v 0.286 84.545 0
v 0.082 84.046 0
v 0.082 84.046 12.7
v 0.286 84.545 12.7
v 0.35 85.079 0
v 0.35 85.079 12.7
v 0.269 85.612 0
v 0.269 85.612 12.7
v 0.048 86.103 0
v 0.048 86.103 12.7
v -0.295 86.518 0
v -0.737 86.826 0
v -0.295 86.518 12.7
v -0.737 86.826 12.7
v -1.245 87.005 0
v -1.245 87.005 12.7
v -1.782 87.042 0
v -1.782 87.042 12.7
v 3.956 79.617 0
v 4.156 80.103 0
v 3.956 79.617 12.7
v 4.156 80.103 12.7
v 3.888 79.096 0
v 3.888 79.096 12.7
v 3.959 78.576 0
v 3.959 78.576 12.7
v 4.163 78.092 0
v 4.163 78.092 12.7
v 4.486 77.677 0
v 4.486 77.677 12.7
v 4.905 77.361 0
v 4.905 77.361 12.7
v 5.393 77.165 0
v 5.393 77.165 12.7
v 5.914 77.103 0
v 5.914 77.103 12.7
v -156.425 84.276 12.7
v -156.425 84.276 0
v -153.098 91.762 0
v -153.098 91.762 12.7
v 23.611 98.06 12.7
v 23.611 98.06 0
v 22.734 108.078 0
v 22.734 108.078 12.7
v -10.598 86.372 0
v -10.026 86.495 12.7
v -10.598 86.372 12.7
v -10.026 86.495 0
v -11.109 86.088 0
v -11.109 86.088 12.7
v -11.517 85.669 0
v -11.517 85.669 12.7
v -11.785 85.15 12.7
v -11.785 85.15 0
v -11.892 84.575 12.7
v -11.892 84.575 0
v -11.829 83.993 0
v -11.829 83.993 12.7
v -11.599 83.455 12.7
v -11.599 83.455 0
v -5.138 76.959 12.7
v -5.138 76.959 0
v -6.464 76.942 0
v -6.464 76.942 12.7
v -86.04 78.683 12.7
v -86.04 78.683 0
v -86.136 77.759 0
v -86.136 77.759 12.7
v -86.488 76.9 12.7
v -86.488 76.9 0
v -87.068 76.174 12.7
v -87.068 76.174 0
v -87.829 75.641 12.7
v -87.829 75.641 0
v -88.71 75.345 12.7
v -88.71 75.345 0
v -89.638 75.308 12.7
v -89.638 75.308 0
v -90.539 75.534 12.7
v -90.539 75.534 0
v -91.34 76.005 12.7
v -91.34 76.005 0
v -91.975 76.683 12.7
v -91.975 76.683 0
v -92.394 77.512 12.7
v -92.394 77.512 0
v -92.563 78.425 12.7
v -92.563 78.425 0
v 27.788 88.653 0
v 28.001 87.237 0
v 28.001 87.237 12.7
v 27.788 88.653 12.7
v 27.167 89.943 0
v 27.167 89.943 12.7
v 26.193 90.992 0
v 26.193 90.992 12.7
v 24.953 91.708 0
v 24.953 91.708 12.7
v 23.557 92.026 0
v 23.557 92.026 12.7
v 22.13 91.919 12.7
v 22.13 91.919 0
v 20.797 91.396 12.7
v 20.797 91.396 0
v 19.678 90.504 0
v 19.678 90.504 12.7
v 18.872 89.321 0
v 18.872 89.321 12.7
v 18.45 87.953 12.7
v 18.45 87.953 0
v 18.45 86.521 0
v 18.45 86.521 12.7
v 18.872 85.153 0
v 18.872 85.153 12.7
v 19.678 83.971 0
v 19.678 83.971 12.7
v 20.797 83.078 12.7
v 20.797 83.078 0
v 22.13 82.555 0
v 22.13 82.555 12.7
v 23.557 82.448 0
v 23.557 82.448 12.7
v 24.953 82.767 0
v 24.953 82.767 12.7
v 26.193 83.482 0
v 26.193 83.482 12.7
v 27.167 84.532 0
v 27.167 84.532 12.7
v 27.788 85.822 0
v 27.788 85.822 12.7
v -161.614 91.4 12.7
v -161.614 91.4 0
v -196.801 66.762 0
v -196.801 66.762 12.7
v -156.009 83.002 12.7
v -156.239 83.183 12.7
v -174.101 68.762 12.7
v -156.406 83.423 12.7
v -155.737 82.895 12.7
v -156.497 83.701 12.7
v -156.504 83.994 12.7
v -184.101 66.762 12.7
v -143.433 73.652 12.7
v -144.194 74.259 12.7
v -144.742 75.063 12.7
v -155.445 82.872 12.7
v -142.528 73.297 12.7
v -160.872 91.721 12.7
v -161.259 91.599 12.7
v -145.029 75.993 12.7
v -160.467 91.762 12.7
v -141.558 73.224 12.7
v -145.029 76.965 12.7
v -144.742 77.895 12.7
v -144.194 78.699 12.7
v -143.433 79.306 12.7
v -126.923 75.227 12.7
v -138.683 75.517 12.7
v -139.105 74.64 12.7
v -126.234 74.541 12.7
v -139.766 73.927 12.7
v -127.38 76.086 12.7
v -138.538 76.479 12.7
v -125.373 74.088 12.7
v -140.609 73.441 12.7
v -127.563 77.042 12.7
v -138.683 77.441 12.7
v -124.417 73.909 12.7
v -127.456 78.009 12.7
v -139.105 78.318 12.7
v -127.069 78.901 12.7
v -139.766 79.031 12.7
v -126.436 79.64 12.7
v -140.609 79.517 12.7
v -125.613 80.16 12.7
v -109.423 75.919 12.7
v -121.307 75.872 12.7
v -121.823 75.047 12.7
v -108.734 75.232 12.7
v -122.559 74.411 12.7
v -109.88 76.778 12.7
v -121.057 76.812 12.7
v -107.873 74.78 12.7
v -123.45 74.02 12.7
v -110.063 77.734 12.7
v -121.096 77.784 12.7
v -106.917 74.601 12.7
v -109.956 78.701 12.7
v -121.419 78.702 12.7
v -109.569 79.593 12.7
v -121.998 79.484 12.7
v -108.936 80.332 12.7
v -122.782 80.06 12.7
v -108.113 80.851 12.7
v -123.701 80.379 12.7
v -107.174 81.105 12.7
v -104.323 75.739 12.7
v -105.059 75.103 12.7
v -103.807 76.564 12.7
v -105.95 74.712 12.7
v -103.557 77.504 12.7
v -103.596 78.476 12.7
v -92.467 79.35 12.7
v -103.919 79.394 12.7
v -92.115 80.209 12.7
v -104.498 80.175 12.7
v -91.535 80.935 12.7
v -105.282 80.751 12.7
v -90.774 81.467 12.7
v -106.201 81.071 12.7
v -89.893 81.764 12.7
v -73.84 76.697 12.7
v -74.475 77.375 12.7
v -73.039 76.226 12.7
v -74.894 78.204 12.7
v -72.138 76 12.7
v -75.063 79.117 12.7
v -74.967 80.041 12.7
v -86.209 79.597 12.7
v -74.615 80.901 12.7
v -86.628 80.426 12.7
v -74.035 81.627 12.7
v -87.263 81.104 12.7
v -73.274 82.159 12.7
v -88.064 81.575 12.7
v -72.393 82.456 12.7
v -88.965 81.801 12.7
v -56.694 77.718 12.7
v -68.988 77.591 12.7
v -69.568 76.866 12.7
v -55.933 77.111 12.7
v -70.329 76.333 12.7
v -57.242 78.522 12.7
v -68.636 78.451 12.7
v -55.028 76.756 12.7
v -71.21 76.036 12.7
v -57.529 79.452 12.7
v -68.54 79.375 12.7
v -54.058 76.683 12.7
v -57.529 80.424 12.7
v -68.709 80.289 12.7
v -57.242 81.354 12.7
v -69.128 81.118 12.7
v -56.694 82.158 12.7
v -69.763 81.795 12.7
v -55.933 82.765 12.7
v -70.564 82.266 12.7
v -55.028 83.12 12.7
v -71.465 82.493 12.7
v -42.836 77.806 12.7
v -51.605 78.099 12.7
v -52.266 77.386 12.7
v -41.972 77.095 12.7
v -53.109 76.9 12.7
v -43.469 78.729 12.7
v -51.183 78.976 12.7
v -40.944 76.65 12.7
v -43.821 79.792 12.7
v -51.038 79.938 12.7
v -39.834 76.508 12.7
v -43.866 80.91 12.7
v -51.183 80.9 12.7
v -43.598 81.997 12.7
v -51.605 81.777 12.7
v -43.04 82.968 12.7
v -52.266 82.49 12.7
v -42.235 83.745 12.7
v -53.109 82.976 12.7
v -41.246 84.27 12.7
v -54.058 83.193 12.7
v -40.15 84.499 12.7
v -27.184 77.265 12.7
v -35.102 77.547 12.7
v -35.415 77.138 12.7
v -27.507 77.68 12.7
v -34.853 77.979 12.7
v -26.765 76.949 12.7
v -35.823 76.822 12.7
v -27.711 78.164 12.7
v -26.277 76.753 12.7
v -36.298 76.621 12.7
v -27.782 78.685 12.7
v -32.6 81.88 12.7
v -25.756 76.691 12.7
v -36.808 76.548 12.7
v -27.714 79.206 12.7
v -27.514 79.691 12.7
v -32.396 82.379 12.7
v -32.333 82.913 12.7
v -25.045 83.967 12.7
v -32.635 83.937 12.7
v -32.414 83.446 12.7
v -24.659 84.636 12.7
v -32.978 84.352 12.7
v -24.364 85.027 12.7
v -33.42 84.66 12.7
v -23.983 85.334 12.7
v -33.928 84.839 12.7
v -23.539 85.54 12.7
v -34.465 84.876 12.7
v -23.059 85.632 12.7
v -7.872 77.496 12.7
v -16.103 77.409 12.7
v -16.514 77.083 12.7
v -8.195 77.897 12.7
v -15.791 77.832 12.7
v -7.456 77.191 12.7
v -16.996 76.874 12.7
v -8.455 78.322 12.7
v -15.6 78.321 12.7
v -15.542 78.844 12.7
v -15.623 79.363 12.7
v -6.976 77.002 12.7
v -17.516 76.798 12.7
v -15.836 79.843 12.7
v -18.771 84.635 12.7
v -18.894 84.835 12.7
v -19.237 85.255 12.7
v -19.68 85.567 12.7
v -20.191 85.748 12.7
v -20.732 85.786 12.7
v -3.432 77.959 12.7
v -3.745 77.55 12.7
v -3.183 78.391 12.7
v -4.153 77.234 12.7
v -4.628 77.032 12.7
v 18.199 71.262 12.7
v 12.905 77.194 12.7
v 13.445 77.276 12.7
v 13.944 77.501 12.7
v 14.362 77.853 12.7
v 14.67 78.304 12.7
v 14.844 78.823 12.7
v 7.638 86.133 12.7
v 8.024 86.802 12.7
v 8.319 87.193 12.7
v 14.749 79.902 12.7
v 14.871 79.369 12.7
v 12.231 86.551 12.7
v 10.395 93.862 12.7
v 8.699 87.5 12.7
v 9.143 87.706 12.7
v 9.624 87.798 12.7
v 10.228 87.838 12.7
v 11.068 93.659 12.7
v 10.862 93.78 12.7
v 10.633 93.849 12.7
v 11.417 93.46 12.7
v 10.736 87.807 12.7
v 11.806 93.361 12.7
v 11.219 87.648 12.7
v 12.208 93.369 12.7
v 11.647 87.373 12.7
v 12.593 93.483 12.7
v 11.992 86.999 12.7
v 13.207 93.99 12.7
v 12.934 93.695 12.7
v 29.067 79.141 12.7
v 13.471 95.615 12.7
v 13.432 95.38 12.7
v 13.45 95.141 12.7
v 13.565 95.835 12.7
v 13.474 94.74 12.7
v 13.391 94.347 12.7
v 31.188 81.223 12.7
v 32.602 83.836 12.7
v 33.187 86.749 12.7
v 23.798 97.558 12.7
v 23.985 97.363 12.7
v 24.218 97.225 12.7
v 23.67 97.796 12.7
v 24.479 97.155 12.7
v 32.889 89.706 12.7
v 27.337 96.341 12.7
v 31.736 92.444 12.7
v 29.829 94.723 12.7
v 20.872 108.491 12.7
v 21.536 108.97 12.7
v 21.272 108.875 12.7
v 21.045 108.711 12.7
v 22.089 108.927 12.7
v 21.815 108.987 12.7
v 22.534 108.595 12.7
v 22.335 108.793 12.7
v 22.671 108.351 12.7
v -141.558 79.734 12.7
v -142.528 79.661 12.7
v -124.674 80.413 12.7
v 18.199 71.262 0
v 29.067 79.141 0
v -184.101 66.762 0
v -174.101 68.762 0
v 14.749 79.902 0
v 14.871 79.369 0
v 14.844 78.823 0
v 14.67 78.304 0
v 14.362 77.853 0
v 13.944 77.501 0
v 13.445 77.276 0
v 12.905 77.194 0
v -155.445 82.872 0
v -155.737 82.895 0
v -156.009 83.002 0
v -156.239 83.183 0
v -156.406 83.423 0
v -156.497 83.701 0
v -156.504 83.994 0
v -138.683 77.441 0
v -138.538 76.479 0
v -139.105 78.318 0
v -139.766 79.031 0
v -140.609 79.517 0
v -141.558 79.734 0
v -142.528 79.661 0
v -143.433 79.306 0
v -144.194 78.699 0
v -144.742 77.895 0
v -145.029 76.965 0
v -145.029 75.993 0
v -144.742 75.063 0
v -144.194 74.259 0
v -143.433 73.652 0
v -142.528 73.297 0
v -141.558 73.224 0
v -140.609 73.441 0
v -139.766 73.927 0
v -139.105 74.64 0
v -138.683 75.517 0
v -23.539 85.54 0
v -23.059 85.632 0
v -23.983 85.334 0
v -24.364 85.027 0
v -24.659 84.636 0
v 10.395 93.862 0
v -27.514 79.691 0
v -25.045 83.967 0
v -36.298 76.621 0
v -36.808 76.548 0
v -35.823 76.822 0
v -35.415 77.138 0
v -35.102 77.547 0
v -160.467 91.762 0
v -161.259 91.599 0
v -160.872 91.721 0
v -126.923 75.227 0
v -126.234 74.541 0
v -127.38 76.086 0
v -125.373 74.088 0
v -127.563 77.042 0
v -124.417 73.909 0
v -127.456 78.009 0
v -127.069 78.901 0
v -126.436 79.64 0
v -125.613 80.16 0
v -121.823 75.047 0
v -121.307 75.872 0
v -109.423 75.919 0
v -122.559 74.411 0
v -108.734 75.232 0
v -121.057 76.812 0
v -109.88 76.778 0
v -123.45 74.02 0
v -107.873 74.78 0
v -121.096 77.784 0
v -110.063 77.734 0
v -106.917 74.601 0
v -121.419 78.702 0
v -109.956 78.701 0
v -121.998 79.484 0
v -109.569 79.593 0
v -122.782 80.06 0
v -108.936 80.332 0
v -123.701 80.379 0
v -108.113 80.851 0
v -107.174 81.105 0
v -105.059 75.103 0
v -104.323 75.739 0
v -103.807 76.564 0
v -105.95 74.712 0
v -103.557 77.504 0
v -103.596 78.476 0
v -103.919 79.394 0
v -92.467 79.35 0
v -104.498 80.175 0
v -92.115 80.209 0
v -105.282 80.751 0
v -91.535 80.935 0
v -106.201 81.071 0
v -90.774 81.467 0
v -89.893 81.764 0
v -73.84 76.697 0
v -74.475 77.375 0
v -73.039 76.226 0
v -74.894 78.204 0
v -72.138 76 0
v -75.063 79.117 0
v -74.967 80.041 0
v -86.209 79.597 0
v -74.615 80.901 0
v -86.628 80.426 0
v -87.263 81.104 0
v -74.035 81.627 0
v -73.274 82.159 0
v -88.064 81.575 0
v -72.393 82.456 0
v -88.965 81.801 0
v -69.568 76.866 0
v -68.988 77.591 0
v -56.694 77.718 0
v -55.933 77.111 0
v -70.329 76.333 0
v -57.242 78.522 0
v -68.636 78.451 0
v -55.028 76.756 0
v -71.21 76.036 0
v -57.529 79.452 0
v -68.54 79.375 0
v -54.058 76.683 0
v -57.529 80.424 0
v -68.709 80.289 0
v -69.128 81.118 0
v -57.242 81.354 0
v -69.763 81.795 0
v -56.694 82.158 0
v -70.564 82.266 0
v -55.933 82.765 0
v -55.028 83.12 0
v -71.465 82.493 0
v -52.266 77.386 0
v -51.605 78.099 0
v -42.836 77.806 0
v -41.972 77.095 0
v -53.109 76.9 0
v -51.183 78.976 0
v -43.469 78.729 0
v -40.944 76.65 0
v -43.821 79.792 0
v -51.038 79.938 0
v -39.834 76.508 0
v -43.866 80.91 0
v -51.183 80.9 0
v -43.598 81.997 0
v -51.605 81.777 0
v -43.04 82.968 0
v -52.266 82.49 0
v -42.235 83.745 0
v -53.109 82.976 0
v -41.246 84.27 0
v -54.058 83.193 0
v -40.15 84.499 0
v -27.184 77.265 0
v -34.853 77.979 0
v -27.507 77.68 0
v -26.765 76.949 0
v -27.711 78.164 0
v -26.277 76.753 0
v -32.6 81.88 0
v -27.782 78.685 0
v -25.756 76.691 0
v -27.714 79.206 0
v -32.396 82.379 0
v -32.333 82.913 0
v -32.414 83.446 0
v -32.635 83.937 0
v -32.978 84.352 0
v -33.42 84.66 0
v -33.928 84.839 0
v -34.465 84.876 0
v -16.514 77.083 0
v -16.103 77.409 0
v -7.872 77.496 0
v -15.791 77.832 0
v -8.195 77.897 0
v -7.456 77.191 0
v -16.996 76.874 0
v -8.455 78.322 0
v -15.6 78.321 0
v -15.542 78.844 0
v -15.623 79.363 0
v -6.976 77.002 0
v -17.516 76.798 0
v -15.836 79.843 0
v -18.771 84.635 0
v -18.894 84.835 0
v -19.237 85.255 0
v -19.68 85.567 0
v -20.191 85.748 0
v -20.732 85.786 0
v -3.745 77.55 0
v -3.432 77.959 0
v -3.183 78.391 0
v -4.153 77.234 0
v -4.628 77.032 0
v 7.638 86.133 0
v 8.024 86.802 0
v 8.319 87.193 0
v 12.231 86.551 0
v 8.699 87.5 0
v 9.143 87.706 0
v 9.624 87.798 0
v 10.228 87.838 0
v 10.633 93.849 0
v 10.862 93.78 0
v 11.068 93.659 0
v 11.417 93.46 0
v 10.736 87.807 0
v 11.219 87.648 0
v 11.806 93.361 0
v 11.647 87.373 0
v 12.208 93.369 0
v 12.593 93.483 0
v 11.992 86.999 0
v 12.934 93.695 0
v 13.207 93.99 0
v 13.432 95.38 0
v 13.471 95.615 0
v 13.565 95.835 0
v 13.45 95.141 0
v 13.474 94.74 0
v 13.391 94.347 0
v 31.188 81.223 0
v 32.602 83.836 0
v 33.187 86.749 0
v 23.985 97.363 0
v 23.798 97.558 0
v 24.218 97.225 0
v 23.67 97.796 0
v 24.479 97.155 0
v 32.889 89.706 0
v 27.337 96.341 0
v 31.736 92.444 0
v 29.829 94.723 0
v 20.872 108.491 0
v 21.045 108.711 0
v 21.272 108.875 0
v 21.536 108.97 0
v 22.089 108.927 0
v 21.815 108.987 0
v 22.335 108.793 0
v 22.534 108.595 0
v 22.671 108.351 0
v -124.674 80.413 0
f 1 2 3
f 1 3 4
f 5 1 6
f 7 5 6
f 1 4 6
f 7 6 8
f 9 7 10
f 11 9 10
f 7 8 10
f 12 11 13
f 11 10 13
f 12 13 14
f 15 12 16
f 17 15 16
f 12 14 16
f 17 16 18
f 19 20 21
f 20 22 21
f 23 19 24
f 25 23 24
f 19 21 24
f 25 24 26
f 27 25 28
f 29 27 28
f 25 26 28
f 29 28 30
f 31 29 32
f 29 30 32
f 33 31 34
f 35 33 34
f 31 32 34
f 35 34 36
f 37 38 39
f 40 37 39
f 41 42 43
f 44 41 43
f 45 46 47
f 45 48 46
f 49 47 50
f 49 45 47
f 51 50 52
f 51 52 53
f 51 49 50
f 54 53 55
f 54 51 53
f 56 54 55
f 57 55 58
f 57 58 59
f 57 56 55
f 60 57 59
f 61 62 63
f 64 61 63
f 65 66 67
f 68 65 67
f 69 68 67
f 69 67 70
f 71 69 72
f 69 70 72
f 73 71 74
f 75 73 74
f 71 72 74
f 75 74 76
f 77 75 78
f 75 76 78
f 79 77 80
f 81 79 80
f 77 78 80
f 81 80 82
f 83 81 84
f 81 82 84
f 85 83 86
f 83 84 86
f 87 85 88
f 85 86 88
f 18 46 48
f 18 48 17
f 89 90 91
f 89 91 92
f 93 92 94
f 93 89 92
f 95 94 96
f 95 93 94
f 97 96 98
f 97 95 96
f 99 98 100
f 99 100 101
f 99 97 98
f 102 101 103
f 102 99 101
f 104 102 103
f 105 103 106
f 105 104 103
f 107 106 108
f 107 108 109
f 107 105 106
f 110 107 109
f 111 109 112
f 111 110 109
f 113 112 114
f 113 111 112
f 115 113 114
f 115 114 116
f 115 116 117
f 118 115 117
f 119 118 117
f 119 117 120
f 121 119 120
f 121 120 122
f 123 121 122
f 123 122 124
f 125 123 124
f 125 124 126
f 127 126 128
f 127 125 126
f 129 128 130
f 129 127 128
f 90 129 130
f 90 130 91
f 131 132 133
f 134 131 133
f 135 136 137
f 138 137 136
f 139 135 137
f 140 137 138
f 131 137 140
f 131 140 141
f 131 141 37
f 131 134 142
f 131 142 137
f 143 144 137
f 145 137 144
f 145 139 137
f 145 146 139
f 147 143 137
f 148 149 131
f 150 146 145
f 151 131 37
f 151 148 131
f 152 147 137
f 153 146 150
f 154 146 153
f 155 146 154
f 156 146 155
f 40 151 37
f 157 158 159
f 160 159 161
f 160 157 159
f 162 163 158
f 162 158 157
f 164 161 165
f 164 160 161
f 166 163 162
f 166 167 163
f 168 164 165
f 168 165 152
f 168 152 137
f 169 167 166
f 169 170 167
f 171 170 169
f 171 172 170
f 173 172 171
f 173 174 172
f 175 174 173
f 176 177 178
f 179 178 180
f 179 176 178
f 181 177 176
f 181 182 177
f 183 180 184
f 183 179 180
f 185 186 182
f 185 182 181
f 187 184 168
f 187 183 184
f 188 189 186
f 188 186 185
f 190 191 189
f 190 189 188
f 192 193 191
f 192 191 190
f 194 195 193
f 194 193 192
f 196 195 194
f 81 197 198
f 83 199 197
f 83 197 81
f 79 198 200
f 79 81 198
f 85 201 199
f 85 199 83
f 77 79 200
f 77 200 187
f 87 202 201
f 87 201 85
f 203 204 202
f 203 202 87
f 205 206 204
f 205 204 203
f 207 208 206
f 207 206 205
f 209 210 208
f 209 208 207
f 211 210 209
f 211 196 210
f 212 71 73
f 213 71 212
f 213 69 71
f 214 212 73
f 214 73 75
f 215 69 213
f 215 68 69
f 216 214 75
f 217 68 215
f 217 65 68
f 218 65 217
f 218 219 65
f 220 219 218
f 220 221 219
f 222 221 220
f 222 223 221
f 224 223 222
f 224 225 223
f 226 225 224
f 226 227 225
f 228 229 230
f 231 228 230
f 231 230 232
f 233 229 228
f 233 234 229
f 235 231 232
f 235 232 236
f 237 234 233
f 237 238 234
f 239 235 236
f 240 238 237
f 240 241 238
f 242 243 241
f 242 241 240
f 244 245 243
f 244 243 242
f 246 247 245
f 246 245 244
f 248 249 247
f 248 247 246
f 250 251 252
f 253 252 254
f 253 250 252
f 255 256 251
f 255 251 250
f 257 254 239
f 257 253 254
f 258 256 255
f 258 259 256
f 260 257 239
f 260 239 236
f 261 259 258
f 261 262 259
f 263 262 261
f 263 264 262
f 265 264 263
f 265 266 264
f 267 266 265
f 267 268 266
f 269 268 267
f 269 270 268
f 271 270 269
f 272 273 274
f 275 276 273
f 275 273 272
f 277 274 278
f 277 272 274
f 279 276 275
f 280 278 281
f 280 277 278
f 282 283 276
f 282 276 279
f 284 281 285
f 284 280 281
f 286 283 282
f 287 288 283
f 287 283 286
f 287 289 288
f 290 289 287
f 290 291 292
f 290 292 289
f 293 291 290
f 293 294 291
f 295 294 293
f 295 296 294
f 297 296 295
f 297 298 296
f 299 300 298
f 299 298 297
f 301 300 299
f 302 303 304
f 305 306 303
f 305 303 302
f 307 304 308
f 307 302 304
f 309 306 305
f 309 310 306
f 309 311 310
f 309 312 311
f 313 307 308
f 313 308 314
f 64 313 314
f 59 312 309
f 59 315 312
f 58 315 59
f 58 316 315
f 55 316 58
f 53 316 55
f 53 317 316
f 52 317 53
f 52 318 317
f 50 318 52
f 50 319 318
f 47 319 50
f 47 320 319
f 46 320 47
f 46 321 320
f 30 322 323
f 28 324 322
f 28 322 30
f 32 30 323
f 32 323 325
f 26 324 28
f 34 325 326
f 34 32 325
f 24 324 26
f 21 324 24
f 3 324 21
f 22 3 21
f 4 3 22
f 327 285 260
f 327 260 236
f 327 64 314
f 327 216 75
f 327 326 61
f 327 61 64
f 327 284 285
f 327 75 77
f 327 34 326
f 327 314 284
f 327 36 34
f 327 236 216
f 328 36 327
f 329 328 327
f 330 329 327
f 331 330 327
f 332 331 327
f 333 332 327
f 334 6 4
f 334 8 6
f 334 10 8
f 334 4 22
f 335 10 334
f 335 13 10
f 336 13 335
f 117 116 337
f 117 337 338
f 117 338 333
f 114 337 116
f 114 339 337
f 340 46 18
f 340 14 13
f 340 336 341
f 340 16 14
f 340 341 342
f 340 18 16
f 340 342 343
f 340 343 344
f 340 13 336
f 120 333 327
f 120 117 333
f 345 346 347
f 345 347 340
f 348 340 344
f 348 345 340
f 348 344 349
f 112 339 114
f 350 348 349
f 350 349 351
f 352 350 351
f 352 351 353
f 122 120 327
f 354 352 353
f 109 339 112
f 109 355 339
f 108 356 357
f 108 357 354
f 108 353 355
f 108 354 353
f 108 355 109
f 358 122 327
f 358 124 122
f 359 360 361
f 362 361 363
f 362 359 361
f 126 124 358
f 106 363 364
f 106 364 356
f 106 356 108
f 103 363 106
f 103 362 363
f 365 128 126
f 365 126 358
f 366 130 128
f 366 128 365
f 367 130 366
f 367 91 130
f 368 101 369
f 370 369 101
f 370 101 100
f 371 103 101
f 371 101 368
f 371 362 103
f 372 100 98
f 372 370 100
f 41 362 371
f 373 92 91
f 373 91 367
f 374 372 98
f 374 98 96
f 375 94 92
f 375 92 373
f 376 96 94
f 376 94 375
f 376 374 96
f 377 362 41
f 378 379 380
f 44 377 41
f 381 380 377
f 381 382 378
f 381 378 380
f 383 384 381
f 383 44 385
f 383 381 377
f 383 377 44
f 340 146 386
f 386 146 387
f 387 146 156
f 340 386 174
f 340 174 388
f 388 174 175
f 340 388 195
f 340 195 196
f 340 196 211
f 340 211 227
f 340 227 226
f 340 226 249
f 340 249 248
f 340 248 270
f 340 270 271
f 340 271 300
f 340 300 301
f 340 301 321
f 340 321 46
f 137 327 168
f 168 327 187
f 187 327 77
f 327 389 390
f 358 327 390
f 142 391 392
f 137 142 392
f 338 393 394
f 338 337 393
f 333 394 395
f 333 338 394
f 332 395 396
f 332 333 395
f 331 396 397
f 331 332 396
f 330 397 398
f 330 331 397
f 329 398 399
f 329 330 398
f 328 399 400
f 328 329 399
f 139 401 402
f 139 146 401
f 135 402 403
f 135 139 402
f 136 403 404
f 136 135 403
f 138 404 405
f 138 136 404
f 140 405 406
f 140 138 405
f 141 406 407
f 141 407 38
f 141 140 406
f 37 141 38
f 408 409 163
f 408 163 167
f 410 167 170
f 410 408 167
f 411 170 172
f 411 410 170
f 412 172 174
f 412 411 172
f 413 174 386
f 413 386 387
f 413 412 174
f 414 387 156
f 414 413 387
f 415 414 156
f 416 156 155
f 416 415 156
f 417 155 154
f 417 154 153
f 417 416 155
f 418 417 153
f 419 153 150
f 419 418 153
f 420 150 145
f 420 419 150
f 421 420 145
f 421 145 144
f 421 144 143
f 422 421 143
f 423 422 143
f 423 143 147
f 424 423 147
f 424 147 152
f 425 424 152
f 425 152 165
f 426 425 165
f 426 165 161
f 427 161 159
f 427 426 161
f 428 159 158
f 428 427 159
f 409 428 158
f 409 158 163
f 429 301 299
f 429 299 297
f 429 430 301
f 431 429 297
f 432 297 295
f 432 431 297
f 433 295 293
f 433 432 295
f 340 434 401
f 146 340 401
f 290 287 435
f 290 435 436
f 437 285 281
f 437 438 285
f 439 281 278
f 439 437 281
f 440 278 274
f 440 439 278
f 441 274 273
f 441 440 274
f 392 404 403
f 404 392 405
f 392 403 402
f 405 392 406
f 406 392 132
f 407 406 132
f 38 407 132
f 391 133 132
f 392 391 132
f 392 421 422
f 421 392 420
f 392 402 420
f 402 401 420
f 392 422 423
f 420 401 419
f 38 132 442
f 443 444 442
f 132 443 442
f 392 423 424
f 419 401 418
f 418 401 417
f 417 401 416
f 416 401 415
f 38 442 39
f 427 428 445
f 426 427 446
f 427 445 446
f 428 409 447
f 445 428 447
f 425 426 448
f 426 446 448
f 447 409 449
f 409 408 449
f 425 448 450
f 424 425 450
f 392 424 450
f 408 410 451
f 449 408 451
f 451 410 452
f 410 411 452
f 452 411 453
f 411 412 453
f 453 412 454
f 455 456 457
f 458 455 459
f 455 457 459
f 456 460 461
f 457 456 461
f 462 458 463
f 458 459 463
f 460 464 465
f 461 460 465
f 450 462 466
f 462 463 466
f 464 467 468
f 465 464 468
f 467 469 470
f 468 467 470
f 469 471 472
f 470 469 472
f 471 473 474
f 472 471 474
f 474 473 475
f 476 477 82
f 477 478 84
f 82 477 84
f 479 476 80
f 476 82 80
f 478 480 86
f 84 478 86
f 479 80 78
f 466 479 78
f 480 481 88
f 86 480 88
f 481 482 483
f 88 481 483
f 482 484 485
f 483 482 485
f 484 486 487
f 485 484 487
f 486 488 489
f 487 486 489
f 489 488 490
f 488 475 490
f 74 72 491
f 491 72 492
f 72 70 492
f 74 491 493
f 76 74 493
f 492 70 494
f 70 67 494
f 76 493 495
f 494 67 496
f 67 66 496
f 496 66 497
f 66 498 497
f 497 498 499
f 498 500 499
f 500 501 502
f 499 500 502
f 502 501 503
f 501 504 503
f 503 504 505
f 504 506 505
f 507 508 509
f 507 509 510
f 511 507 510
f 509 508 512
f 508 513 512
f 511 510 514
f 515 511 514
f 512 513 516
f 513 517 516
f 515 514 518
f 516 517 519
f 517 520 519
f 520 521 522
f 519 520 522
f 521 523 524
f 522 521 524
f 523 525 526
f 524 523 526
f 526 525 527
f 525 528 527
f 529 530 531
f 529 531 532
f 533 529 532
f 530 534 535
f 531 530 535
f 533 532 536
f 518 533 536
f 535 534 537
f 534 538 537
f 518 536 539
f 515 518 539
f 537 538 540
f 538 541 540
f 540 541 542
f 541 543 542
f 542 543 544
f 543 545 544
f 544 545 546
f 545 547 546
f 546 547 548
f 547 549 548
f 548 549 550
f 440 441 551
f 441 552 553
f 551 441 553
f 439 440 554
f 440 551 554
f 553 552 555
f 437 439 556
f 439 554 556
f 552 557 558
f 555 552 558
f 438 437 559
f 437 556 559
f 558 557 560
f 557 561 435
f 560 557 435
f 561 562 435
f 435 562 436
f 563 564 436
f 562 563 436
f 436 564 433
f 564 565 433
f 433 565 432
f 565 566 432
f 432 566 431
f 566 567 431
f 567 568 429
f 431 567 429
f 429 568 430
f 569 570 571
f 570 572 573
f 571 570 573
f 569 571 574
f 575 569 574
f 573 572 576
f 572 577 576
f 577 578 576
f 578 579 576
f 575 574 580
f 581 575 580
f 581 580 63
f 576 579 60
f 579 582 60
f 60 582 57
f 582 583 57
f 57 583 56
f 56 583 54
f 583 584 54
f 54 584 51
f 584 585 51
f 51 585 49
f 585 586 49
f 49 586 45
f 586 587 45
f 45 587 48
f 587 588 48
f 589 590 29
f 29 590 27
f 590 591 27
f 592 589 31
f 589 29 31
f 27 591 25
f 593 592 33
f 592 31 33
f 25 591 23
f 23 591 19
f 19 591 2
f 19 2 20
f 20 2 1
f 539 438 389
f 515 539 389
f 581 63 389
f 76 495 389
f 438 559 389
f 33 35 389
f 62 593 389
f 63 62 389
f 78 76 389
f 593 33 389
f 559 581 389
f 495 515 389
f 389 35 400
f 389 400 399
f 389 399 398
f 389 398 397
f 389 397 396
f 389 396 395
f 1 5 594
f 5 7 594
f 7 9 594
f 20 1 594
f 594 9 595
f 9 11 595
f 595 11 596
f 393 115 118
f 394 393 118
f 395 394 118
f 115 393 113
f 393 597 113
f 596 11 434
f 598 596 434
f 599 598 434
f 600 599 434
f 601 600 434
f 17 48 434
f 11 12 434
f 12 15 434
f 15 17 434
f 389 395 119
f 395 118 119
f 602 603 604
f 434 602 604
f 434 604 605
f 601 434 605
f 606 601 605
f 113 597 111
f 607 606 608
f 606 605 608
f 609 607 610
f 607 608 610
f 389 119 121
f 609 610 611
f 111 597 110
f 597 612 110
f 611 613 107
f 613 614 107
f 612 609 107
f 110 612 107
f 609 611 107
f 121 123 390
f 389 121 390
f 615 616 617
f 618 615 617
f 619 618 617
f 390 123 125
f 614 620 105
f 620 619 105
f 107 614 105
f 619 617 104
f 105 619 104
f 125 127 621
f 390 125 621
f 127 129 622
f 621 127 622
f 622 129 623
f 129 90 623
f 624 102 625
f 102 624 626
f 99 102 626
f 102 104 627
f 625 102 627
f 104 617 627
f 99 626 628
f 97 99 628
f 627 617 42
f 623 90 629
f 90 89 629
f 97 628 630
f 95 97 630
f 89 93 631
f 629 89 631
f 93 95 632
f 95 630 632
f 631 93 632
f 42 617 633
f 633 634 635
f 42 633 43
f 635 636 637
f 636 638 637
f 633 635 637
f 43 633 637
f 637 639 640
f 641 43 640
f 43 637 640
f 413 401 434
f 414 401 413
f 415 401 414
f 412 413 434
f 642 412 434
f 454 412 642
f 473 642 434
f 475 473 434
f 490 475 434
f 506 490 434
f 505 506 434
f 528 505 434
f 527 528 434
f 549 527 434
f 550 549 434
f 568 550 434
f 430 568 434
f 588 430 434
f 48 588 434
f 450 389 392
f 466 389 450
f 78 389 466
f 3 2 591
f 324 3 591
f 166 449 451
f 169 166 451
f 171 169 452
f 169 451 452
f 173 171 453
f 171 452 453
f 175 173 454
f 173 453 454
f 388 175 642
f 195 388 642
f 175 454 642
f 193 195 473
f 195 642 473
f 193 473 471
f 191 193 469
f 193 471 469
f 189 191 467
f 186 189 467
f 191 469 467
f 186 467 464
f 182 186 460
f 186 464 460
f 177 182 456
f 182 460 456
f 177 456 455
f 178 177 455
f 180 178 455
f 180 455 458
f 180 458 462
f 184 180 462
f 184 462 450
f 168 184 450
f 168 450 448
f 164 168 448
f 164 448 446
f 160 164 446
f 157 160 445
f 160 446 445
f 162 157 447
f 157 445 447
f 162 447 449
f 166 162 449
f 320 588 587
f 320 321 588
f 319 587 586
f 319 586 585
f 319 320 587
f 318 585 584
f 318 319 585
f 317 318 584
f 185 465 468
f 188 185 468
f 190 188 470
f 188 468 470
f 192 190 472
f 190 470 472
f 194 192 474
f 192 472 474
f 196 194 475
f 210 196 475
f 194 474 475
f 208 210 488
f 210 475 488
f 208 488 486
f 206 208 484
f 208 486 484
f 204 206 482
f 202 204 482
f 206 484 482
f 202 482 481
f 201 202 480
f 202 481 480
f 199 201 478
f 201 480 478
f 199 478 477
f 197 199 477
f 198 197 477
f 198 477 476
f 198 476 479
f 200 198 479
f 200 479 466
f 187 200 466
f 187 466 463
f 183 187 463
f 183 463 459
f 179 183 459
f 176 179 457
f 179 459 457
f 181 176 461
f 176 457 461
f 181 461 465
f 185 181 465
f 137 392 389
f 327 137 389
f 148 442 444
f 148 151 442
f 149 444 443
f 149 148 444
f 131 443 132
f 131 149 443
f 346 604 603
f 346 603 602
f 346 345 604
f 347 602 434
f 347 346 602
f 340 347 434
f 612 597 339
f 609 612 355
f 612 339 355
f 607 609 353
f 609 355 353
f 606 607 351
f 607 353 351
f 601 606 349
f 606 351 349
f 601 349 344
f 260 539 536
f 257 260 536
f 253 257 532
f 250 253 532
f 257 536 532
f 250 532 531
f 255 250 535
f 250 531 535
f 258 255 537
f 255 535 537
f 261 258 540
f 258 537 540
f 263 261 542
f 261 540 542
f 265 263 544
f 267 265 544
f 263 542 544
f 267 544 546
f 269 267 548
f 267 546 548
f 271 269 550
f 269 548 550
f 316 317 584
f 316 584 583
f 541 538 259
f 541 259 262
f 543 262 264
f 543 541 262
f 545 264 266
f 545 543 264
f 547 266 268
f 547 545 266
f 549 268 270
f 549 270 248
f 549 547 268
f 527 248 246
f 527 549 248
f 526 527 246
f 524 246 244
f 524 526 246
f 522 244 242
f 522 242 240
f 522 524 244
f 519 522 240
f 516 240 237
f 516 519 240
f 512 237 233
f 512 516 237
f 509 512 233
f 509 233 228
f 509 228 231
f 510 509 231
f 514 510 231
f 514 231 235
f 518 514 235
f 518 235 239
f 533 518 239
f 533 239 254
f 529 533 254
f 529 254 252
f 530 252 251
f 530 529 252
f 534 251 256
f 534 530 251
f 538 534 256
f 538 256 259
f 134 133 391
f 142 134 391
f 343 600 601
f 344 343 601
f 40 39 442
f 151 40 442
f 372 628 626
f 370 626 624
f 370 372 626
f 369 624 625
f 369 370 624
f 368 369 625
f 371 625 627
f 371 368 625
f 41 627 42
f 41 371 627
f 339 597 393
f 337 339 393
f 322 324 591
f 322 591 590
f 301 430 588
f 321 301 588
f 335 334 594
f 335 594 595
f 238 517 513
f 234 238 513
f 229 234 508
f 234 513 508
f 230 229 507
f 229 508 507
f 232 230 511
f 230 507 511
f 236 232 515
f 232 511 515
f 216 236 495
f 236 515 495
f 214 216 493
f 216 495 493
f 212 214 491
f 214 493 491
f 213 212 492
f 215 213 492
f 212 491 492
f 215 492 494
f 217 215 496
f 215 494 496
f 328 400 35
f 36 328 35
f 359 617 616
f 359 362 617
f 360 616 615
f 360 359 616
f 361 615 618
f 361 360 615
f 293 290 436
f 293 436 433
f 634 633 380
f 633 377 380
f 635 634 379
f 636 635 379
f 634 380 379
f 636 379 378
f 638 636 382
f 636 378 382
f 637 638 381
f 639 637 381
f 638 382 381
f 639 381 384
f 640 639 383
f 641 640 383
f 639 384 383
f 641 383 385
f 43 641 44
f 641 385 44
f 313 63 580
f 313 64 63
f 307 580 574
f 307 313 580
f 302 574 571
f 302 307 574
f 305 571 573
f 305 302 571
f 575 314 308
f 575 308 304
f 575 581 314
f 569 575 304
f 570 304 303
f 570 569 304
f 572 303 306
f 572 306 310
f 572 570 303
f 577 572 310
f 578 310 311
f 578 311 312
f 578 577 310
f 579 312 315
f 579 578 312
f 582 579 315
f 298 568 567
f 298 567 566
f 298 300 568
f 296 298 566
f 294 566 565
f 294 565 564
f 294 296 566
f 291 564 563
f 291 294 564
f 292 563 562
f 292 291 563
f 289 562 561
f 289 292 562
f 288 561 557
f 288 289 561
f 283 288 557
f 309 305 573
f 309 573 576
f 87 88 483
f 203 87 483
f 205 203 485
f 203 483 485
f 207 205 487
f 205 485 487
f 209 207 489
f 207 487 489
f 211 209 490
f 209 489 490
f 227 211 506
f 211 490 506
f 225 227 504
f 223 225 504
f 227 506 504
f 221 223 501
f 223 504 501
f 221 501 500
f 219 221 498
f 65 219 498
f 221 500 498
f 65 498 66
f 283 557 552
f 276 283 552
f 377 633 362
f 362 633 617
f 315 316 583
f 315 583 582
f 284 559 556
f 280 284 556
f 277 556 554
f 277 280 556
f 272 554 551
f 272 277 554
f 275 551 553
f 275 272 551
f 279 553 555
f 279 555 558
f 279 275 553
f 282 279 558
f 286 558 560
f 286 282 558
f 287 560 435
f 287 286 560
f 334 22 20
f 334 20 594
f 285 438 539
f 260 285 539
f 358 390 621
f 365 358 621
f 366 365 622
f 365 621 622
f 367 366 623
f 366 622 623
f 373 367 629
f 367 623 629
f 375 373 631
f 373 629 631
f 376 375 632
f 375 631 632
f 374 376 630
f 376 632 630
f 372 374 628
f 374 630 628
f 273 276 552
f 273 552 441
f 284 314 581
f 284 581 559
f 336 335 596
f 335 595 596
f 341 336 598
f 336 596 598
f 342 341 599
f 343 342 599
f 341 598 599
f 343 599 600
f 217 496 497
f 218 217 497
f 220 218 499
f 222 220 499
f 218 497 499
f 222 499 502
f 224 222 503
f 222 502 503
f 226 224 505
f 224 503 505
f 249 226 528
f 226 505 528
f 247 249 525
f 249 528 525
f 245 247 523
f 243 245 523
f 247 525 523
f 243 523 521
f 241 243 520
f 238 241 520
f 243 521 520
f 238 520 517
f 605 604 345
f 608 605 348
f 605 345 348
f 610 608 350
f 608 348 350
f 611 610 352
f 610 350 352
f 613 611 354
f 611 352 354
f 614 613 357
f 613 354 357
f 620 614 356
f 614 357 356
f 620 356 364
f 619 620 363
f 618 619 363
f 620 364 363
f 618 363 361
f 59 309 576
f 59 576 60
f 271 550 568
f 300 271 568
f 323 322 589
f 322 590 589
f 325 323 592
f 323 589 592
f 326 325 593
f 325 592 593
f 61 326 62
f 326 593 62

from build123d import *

# Parameters (mm, degrees)
SKETCH1_R           = 3.2639
SKETCH1_R_2         = 4.8025
BOSS_EXTRUDE1_DEPTH = 12.7
SKETCH2_R           = 1.5
CUT_EXTRUDE1_DEPTH  = 227.41953776
EXTRUDE_THIN1_DEPTH = 12.7
FILLET1_R           = 2
FILLET2_R           = 1
FILLET3_R           = 1
FILLET4_R           = 2
FILLET5_R           = 1


with BuildPart() as part:
    # Sketch1 → Boss-Extrude1 (new body)
    with BuildSketch(Plane.XY):
        with BuildLine():
            Line((-196.801436578, 66.762186411), (-184.101436578, 66.762186411))
            Line((-184.101436578, 66.762186411), (-174.101436578, 68.762186411))
            Line((-174.101436578, 68.762186411), (18.198563422, 71.262186411))
            Line((18.198563422, 71.262186411), (29.067448443, 79.140508783))
            ThreePointArc((29.067448443, 79.140508783), (32.782860984, 90.090472281), (23.683493494, 97.225421632))
            Line((23.683493494, 97.225421632), (22.457622919, 111.237186411))
            Line((22.457622919, 111.237186411), (12.506829792, 94.001907138))
            Line((12.506829792, 94.001907138), (-157.097736409, 82.762186411))
            Line((-157.097736409, 82.762186411), (-153.097736409, 91.762186411))
            Line((-153.097736409, 91.762186411), (-161.097736409, 91.762186411))
            Line((-161.097736409, 91.762186411), (-196.801436578, 66.762186411))
        make_face()
        with Locations((-141.801436578, 76.478988882)):
            Circle(SKETCH1_R, mode=Mode.SUBTRACT)
        with BuildLine():
            ThreePointArc((-121.040083953, 77.299723999), (-124.172509206, 73.909444003), (-127.562789202, 77.041869256))
            ThreePointArc((-127.562789202, 77.041869256), (-124.430363949, 80.432149252), (-121.040083953, 77.299723999))
        make_face(mode=Mode.SUBTRACT)
        with BuildLine():
            ThreePointArc((-103.540083953, 77.991531744), (-106.672509206, 74.601251748), (-110.062789202, 77.733677001))
            ThreePointArc((-110.062789202, 77.733677001), (-106.930363949, 81.123956997), (-103.540083953, 77.991531744))
        make_face(mode=Mode.SUBTRACT)
        with BuildLine():
            ThreePointArc((-86.040083953, 78.68333949), (-89.172509206, 75.293059493), (-92.562789202, 78.425484746))
            ThreePointArc((-92.562789202, 78.425484746), (-89.430363949, 81.815764743), (-86.040083953, 78.68333949))
        make_face(mode=Mode.SUBTRACT)
        with BuildLine():
            ThreePointArc((-68.540083953, 79.375147235), (-71.672509206, 75.984867239), (-75.062789202, 79.117292491))
            ThreePointArc((-75.062789202, 79.117292491), (-71.930363949, 82.507572488), (-68.540083953, 79.375147235))
        make_face(mode=Mode.SUBTRACT)
        with Locations((-54.301436578, 79.938027609)):
            Circle(SKETCH1_R, mode=Mode.SUBTRACT)
        with BuildLine():
            ThreePointArc((-39.833809225, 76.508242407), (-43.882673124, 80.349599411), (-40.150307356, 84.499149782))
            Line((-40.150307356, 84.499149782), (11.706060944, 87.935679297))
            Line((11.706060944, 87.935679297), (15.760597764, 77.230998609))
            Line((15.760597764, 77.230998609), (-39.833809225, 76.508242407))
        make_face(mode=Mode.SUBTRACT)
        with Locations((23.198563422, 87.237186411)):
            Circle(SKETCH1_R_2, mode=Mode.SUBTRACT)
    extrude(amount=BOSS_EXTRUDE1_DEPTH)

    # Sketch2 → Cut-Extrude1 (cut, through all)
    with BuildSketch(Plane.XY.offset(12.7)):
        with Locations((11.978454756, 94.850918223)):
            Circle(SKETCH2_R)
    extrude(amount=-CUT_EXTRUDE1_DEPTH, mode=Mode.SUBTRACT)

    # Sketch3 → Extrude-Thin1 (add)
    with BuildSketch(Plane.XY.offset(12.7)):
        Polygon((4.374887162, 91.481339263), (2.874887162, 88.883263052), (-3.183006438, 78.390683549), (-4.683006438, 75.792607338), (0.080133283, 73.042607338), (1.580133283, 75.640683549), (7.638026883, 86.133263052), (9.138026883, 88.731339263), align=None)
        Polygon((-6.366359526, 74.910825854), (-8.455450886, 78.321939644), (-14.081085771, 87.507598585), (-16.170177131, 90.918712375), (-20.860458592, 88.046211754), (-18.771367232, 84.635097964), (-13.145732348, 75.449439024), (-11.056640987, 72.038325234), align=None)
        Polygon((-28.307796362, 89.315452792), (-29.807796362, 86.71737658), (-34.852924598, 77.978958144), (-36.352924598, 75.380881933), (-31.589784877, 72.630881933), (-30.089784877, 75.228958144), (-25.044656641, 83.96737658), (-23.544656641, 86.565452792), align=None)
    extrude(amount=-EXTRUDE_THIN1_DEPTH)

    # Fillet1
    fillet1_edges = [part.edges().sort_by_distance(p)[0] for p in [
        (-4.000877594, 76.974089152, 6.35),
        (1.954701783, 87.289455223, 6.35),
        (2.398004439, 77.057277946, 6.35),
        (8.558212262, 87.72707088, 6.35),
        (-13.999872127, 76.844097024, 6.35),
        (-19.525203724, 85.865978577, 6.35),
        (-7.601311108, 76.927281645, 6.35),
        (-13.327249279, 86.276717973, 6.35),
        (-35.670795755, 76.562363747, 6.35),
        (-30.727981741, 85.123568752, 6.35),
        (-29.271913721, 76.645552541, 6.35),
        (-24.124471262, 85.561184409, 6.35),
        (15.760597764, 77.230998609, 6.35),
        (11.706060944, 87.935679297, 6.35),
    ]]
    fillet(fillet1_edges, radius=FILLET1_R)

    # Fillet2
    fillet2_edges = [part.edges().sort_by_distance(p)[0] for p in [
        (13.348980962, 95.460555753, 6.35),
        (10.826213816, 93.890532459, 6.35),
    ]]
    fillet(fillet2_edges, radius=FILLET2_R)

    # Fillet3
    fillet3_edges = [part.edges().sort_by_distance(p)[0] for p in [
        (-157.097736409, 82.762186411, 6.35),
    ]]
    fillet(fillet3_edges, radius=FILLET3_R)

    # Fillet4
    fillet4_edges = [part.edges().sort_by_distance(p)[0] for p in [
        (-161.097736409, 91.762186411, 6.35),
    ]]
    fillet(fillet4_edges, radius=FILLET4_R)

    # Fillet5
    fillet5_edges = [part.edges().sort_by_distance(p)[0] for p in [
        (22.457622919, 111.237186411, 6.35),
        (23.683493494, 97.225421632, 6.35),
    ]]
    fillet(fillet5_edges, radius=FILLET5_R)


solid = part.part
